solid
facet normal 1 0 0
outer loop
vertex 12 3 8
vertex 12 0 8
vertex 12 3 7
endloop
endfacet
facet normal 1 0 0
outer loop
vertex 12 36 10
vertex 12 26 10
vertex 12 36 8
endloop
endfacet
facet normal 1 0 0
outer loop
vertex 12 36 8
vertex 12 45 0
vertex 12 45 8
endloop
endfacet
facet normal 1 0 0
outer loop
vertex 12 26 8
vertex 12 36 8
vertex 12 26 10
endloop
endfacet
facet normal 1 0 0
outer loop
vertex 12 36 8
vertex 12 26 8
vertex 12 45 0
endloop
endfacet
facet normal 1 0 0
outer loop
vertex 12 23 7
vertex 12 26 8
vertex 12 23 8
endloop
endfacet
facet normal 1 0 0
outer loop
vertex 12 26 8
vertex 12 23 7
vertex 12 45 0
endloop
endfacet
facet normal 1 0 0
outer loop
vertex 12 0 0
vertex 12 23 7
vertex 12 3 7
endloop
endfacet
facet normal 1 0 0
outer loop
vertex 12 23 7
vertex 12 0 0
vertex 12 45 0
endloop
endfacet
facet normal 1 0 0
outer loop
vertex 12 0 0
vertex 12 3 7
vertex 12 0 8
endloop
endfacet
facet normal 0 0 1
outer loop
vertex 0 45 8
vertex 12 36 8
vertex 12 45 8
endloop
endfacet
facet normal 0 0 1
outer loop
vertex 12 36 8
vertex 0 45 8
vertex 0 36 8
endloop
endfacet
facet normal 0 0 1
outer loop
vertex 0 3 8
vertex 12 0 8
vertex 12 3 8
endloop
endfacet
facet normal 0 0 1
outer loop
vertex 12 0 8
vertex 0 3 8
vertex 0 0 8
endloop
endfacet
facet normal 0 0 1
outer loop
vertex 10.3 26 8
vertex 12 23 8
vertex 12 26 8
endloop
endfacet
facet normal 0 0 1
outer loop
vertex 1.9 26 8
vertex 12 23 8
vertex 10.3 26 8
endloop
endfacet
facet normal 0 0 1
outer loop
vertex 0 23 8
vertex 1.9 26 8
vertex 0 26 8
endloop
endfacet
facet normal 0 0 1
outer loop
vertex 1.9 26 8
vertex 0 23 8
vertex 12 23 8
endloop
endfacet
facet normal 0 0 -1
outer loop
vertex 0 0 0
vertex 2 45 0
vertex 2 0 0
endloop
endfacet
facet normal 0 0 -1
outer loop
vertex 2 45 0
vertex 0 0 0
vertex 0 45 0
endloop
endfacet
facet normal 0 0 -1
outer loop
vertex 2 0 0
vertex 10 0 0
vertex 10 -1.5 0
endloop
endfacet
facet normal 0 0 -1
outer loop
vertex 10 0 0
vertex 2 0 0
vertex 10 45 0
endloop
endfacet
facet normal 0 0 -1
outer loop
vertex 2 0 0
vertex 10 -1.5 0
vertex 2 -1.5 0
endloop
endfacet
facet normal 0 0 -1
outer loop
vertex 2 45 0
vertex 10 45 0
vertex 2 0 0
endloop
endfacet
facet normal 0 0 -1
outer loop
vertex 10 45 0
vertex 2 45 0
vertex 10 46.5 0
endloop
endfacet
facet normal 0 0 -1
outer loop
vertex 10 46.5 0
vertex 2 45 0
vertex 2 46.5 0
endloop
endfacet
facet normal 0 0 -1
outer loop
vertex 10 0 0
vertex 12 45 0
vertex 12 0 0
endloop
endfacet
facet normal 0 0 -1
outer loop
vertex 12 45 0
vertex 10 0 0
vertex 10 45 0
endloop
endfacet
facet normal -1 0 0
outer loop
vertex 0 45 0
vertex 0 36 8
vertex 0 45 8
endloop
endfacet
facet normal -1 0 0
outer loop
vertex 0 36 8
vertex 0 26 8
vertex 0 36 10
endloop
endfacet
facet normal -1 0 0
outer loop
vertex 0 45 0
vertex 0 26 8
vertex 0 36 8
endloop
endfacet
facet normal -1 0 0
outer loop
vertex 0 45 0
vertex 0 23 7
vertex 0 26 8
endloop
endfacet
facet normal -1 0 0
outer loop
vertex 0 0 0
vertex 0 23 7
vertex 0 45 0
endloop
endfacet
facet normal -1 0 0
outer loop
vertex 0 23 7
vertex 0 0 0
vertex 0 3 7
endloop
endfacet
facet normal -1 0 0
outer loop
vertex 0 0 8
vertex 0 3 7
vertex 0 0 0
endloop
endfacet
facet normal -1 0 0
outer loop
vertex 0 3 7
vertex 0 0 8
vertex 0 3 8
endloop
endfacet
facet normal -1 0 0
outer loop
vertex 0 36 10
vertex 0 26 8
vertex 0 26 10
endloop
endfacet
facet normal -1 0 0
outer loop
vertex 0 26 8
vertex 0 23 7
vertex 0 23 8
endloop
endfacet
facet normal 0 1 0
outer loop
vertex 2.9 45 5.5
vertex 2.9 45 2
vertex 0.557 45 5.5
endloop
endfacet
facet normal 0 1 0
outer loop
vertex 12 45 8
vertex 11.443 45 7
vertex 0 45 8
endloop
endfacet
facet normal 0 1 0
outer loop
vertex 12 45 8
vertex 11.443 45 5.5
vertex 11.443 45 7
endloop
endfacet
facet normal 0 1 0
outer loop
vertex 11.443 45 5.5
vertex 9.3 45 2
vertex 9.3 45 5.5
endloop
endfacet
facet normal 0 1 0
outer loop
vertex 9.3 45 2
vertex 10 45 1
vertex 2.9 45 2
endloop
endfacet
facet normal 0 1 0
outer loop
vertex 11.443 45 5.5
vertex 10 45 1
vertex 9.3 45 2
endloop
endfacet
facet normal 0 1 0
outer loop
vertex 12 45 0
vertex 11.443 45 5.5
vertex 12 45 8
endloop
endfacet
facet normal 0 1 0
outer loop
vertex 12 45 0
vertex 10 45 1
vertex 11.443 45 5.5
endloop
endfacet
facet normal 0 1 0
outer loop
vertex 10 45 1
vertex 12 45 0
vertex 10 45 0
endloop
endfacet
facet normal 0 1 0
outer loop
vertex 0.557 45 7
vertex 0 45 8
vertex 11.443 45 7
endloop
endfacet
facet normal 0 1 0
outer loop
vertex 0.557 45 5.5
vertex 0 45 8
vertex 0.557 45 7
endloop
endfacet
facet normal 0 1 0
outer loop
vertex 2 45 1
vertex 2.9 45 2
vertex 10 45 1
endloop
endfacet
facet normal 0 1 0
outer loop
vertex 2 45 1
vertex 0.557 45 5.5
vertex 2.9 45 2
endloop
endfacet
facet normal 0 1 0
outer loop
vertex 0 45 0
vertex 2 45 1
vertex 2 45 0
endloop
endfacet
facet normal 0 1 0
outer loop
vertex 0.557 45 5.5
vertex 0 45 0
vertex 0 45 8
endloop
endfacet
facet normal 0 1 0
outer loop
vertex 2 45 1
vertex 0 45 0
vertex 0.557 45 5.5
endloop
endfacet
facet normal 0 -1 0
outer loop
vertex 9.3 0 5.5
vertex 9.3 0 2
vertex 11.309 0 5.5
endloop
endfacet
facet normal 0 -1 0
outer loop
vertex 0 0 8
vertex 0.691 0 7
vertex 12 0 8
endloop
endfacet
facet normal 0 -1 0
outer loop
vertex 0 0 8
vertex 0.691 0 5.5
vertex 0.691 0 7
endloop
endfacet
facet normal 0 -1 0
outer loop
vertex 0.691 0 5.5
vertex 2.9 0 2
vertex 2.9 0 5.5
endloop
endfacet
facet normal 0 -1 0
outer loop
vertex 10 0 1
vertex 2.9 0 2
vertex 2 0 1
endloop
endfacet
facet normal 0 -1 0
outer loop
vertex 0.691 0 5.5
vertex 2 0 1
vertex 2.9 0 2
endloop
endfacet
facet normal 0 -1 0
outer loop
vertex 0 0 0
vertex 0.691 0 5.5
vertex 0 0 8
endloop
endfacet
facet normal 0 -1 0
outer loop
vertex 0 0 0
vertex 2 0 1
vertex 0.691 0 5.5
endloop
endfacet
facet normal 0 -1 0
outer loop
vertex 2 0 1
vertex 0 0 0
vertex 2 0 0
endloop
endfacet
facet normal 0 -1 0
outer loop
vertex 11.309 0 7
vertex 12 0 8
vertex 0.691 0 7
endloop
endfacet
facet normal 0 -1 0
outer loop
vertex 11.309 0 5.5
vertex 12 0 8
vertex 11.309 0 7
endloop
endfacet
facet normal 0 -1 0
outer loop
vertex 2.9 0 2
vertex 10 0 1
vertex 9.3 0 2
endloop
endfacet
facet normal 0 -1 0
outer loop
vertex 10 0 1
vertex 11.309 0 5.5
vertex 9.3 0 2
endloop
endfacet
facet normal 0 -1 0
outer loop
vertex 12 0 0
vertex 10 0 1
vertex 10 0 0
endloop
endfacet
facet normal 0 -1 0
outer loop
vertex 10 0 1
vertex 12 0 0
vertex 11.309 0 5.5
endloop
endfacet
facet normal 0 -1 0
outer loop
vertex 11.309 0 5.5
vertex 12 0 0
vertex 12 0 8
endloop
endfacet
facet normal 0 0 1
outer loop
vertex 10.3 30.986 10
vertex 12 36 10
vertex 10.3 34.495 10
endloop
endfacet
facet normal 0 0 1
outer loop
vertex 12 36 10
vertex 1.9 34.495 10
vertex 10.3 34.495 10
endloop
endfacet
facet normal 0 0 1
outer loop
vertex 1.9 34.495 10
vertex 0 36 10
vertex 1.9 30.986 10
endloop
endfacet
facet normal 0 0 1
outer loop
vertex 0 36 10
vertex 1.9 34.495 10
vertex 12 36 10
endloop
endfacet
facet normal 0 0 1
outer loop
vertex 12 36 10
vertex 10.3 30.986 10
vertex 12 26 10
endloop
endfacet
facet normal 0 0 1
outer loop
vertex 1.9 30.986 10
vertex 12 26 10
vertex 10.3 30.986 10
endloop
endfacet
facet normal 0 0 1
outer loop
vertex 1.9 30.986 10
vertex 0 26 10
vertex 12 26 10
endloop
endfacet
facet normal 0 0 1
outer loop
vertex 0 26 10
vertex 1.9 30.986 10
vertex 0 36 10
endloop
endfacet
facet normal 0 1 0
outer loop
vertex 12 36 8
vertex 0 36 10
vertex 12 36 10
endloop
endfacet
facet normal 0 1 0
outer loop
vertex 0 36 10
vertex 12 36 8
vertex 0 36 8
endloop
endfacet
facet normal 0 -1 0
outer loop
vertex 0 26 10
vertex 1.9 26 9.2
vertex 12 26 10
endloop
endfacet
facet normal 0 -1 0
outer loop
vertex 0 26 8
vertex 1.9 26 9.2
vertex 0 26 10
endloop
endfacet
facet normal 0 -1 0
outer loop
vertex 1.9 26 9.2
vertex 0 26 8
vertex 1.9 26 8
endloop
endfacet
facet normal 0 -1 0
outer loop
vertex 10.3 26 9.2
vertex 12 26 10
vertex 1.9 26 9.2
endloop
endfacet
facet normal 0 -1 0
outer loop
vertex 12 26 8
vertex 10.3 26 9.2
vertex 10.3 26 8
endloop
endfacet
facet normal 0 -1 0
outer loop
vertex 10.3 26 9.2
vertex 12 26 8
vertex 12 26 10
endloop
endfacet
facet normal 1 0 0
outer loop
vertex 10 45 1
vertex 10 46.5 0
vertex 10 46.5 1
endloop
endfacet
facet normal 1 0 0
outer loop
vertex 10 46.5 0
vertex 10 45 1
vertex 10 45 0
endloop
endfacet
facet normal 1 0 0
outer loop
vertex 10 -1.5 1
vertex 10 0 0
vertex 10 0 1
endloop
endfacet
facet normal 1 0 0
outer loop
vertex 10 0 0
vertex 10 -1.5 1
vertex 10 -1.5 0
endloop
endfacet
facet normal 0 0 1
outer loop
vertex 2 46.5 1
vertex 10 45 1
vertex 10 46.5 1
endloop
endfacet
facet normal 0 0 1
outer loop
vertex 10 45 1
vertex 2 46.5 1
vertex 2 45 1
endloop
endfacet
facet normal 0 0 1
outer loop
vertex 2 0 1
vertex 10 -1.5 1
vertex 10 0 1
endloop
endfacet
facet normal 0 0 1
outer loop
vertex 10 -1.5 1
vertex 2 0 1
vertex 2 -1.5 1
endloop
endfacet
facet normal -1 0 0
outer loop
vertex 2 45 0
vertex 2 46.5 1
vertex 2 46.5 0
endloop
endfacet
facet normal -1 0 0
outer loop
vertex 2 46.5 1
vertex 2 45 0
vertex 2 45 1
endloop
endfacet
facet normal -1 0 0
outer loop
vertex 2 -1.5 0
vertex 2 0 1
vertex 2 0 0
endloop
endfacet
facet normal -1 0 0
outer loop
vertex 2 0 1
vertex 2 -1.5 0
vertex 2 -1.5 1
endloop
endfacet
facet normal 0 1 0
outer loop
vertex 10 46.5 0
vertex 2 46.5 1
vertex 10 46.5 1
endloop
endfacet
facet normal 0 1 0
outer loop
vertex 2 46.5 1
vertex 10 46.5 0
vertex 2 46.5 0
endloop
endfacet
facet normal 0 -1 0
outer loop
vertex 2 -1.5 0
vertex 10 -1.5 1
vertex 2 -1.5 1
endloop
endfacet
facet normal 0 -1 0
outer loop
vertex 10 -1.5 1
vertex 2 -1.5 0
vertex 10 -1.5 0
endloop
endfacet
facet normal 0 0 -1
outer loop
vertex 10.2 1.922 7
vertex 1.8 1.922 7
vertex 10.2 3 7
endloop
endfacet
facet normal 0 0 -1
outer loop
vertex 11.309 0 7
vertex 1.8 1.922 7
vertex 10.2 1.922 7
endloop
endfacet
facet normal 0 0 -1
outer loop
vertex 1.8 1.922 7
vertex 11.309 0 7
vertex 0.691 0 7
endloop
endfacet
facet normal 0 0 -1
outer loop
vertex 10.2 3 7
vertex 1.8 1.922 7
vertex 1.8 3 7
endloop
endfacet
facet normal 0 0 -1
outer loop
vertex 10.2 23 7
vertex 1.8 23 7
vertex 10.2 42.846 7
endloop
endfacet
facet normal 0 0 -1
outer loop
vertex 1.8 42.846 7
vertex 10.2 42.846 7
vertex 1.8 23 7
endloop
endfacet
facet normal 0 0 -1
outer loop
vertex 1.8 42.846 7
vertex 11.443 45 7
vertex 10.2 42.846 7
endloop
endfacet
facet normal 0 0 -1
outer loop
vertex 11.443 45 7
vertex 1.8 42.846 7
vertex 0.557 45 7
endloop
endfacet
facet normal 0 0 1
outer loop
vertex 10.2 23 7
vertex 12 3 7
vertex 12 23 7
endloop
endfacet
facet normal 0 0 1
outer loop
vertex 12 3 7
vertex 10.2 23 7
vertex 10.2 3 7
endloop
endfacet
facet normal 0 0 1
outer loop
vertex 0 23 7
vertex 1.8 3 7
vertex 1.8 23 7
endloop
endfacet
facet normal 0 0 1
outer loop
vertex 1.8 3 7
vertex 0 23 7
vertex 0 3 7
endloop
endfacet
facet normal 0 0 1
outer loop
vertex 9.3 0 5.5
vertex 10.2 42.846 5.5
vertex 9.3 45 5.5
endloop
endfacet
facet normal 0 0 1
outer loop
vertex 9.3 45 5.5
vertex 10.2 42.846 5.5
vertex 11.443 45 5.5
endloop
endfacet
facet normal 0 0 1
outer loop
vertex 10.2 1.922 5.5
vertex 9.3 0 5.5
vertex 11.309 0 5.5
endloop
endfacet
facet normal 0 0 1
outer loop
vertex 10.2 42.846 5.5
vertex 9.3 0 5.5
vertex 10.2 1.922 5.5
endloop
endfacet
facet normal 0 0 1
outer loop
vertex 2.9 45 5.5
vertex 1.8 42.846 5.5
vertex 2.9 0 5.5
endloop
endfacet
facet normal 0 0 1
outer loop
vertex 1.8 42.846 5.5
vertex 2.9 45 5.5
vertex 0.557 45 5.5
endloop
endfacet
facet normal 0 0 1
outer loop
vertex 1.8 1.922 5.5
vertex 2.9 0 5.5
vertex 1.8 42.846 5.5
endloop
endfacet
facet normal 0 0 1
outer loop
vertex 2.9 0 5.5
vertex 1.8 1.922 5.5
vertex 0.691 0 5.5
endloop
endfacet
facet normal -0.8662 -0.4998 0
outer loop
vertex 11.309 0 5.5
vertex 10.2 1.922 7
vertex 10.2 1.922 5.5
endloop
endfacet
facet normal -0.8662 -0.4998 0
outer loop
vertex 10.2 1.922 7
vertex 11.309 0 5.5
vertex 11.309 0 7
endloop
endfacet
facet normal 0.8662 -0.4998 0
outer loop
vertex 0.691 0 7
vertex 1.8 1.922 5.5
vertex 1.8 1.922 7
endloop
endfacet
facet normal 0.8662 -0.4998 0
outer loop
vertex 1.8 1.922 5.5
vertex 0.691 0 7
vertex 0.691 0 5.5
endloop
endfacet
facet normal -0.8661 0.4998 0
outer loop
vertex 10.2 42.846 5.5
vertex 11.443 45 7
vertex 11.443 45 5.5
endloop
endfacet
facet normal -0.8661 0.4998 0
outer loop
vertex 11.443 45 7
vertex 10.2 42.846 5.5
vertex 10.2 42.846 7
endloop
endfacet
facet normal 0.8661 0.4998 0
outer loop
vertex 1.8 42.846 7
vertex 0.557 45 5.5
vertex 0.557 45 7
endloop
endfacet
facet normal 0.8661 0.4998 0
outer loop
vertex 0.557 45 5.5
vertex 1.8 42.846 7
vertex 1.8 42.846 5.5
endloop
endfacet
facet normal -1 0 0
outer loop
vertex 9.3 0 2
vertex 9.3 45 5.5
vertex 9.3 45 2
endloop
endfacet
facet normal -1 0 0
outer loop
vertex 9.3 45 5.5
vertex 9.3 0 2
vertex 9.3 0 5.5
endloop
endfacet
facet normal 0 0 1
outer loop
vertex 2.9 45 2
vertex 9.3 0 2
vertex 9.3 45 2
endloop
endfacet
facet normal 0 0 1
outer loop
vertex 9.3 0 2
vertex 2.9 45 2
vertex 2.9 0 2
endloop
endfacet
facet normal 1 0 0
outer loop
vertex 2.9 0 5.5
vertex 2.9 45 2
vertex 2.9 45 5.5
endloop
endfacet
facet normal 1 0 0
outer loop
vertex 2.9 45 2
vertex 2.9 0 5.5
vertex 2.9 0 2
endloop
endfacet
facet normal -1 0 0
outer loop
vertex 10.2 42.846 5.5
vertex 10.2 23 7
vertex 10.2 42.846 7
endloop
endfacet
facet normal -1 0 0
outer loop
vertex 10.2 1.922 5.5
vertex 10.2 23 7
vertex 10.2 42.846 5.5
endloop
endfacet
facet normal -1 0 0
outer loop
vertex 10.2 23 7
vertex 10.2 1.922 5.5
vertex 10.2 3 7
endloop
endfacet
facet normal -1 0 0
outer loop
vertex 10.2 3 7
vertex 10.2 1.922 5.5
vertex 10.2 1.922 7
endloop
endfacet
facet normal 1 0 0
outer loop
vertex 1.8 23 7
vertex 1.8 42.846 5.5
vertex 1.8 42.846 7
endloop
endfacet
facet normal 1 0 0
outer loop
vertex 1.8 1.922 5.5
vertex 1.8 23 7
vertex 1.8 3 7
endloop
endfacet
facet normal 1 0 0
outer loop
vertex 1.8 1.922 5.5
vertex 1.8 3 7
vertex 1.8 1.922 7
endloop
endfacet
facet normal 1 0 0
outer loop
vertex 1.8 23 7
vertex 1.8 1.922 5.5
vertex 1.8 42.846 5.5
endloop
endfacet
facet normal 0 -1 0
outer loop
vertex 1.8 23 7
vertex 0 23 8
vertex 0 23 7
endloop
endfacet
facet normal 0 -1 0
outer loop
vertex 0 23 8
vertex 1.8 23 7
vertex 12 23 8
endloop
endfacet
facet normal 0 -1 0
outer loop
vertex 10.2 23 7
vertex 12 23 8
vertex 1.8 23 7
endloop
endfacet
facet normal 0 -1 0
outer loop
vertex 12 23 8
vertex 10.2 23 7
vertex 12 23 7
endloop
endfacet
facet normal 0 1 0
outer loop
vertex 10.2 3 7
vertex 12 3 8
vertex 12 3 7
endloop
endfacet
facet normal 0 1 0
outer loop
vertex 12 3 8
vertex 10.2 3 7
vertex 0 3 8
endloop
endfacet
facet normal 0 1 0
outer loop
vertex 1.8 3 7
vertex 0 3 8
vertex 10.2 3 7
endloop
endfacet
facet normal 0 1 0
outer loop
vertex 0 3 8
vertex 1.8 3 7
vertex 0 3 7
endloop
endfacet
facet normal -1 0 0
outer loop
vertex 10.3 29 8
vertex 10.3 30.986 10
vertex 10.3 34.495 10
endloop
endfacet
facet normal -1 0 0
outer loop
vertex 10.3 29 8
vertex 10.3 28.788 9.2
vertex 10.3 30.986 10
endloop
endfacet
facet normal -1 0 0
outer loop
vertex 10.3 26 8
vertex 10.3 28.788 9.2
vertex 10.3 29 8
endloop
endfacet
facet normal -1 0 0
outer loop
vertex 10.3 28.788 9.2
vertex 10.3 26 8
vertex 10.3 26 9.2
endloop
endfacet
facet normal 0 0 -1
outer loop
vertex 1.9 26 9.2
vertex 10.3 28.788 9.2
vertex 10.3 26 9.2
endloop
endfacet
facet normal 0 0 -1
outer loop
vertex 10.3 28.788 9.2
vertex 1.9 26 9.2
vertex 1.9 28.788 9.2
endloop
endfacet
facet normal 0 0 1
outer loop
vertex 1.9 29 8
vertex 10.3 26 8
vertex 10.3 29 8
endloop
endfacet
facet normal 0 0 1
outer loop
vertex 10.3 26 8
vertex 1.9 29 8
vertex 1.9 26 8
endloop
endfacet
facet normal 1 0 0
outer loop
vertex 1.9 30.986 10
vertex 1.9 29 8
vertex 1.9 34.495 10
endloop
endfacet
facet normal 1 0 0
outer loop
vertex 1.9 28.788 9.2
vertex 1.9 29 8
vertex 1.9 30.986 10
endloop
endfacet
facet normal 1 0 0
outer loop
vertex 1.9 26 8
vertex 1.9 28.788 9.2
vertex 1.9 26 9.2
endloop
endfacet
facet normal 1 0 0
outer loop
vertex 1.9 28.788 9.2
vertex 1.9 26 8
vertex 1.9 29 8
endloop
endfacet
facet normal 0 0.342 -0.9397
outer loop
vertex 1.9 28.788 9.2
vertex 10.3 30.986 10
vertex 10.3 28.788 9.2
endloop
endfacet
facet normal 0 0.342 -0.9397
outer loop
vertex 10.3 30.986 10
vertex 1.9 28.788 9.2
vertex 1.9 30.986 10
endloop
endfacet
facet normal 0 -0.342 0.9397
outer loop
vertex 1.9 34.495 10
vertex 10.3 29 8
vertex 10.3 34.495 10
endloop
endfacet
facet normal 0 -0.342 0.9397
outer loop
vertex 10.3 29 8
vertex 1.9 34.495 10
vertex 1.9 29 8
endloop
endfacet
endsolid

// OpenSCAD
// Designed by Stanley <stanoba@gmail.com>
// SMD Feeder <smd_feeder.scad>
// Version: 0.1
// Creative Commons - Attribution license
// https://www.thingiverse.com/stanoba/about
// Inspired by https://www.thingiverse.com/thing:675336/ and https://www.thingiverse.com/thing:690054
// Use width SMD feeder rails https://www.thingiverse.com/thing:2414978

inner_width=8;  // [8:8mm,12:12mm,16:16mm,24:24mm]
inner_height=5;  // [2:10]

difference(){

	union(){
		cube([inner_width+4,45,inner_height+3]); // main shape
		translate([0,26,inner_height+2]) cube([inner_width+4,10,3]); // main shape top
		translate([2,-1.5,0]) cube([inner_width,48,1]); // main shape, bottom nipple
	}
	// corners
	translate([inner_width+1,-2,inner_height+0.5]) rotate([0,0,30]) cube([3,3,1.5]);
	translate([3,-2,inner_height+0.5]) rotate([0,0,60]) cube([3,3,1.5]);
	translate([inner_width+2,42.5,inner_height+0.5]) rotate([0,0,60]) cube([3,3,1.5]);
	translate([2,42.5,inner_height+0.5]) rotate([0,0,30]) cube([3,3,1.5]); 

	translate([2.9,0,2]) cube([inner_width-2+0.4,50,inner_height]); //inner shape 1
	translate([1.8,0,inner_height+0.5]) cube([inner_width+0.4,50,1.5]); // inner shape 2

	translate([0,3,inner_height+2]) cube([inner_width+4,20,1]); // main window

	translate([1.9,26,inner_height+3]) cube([inner_width+0.4,3,1.2]);
	translate([1.9,29,inner_height+3]) rotate([20,0,0]) cube([inner_width+0.4,10,1.2]);
}
